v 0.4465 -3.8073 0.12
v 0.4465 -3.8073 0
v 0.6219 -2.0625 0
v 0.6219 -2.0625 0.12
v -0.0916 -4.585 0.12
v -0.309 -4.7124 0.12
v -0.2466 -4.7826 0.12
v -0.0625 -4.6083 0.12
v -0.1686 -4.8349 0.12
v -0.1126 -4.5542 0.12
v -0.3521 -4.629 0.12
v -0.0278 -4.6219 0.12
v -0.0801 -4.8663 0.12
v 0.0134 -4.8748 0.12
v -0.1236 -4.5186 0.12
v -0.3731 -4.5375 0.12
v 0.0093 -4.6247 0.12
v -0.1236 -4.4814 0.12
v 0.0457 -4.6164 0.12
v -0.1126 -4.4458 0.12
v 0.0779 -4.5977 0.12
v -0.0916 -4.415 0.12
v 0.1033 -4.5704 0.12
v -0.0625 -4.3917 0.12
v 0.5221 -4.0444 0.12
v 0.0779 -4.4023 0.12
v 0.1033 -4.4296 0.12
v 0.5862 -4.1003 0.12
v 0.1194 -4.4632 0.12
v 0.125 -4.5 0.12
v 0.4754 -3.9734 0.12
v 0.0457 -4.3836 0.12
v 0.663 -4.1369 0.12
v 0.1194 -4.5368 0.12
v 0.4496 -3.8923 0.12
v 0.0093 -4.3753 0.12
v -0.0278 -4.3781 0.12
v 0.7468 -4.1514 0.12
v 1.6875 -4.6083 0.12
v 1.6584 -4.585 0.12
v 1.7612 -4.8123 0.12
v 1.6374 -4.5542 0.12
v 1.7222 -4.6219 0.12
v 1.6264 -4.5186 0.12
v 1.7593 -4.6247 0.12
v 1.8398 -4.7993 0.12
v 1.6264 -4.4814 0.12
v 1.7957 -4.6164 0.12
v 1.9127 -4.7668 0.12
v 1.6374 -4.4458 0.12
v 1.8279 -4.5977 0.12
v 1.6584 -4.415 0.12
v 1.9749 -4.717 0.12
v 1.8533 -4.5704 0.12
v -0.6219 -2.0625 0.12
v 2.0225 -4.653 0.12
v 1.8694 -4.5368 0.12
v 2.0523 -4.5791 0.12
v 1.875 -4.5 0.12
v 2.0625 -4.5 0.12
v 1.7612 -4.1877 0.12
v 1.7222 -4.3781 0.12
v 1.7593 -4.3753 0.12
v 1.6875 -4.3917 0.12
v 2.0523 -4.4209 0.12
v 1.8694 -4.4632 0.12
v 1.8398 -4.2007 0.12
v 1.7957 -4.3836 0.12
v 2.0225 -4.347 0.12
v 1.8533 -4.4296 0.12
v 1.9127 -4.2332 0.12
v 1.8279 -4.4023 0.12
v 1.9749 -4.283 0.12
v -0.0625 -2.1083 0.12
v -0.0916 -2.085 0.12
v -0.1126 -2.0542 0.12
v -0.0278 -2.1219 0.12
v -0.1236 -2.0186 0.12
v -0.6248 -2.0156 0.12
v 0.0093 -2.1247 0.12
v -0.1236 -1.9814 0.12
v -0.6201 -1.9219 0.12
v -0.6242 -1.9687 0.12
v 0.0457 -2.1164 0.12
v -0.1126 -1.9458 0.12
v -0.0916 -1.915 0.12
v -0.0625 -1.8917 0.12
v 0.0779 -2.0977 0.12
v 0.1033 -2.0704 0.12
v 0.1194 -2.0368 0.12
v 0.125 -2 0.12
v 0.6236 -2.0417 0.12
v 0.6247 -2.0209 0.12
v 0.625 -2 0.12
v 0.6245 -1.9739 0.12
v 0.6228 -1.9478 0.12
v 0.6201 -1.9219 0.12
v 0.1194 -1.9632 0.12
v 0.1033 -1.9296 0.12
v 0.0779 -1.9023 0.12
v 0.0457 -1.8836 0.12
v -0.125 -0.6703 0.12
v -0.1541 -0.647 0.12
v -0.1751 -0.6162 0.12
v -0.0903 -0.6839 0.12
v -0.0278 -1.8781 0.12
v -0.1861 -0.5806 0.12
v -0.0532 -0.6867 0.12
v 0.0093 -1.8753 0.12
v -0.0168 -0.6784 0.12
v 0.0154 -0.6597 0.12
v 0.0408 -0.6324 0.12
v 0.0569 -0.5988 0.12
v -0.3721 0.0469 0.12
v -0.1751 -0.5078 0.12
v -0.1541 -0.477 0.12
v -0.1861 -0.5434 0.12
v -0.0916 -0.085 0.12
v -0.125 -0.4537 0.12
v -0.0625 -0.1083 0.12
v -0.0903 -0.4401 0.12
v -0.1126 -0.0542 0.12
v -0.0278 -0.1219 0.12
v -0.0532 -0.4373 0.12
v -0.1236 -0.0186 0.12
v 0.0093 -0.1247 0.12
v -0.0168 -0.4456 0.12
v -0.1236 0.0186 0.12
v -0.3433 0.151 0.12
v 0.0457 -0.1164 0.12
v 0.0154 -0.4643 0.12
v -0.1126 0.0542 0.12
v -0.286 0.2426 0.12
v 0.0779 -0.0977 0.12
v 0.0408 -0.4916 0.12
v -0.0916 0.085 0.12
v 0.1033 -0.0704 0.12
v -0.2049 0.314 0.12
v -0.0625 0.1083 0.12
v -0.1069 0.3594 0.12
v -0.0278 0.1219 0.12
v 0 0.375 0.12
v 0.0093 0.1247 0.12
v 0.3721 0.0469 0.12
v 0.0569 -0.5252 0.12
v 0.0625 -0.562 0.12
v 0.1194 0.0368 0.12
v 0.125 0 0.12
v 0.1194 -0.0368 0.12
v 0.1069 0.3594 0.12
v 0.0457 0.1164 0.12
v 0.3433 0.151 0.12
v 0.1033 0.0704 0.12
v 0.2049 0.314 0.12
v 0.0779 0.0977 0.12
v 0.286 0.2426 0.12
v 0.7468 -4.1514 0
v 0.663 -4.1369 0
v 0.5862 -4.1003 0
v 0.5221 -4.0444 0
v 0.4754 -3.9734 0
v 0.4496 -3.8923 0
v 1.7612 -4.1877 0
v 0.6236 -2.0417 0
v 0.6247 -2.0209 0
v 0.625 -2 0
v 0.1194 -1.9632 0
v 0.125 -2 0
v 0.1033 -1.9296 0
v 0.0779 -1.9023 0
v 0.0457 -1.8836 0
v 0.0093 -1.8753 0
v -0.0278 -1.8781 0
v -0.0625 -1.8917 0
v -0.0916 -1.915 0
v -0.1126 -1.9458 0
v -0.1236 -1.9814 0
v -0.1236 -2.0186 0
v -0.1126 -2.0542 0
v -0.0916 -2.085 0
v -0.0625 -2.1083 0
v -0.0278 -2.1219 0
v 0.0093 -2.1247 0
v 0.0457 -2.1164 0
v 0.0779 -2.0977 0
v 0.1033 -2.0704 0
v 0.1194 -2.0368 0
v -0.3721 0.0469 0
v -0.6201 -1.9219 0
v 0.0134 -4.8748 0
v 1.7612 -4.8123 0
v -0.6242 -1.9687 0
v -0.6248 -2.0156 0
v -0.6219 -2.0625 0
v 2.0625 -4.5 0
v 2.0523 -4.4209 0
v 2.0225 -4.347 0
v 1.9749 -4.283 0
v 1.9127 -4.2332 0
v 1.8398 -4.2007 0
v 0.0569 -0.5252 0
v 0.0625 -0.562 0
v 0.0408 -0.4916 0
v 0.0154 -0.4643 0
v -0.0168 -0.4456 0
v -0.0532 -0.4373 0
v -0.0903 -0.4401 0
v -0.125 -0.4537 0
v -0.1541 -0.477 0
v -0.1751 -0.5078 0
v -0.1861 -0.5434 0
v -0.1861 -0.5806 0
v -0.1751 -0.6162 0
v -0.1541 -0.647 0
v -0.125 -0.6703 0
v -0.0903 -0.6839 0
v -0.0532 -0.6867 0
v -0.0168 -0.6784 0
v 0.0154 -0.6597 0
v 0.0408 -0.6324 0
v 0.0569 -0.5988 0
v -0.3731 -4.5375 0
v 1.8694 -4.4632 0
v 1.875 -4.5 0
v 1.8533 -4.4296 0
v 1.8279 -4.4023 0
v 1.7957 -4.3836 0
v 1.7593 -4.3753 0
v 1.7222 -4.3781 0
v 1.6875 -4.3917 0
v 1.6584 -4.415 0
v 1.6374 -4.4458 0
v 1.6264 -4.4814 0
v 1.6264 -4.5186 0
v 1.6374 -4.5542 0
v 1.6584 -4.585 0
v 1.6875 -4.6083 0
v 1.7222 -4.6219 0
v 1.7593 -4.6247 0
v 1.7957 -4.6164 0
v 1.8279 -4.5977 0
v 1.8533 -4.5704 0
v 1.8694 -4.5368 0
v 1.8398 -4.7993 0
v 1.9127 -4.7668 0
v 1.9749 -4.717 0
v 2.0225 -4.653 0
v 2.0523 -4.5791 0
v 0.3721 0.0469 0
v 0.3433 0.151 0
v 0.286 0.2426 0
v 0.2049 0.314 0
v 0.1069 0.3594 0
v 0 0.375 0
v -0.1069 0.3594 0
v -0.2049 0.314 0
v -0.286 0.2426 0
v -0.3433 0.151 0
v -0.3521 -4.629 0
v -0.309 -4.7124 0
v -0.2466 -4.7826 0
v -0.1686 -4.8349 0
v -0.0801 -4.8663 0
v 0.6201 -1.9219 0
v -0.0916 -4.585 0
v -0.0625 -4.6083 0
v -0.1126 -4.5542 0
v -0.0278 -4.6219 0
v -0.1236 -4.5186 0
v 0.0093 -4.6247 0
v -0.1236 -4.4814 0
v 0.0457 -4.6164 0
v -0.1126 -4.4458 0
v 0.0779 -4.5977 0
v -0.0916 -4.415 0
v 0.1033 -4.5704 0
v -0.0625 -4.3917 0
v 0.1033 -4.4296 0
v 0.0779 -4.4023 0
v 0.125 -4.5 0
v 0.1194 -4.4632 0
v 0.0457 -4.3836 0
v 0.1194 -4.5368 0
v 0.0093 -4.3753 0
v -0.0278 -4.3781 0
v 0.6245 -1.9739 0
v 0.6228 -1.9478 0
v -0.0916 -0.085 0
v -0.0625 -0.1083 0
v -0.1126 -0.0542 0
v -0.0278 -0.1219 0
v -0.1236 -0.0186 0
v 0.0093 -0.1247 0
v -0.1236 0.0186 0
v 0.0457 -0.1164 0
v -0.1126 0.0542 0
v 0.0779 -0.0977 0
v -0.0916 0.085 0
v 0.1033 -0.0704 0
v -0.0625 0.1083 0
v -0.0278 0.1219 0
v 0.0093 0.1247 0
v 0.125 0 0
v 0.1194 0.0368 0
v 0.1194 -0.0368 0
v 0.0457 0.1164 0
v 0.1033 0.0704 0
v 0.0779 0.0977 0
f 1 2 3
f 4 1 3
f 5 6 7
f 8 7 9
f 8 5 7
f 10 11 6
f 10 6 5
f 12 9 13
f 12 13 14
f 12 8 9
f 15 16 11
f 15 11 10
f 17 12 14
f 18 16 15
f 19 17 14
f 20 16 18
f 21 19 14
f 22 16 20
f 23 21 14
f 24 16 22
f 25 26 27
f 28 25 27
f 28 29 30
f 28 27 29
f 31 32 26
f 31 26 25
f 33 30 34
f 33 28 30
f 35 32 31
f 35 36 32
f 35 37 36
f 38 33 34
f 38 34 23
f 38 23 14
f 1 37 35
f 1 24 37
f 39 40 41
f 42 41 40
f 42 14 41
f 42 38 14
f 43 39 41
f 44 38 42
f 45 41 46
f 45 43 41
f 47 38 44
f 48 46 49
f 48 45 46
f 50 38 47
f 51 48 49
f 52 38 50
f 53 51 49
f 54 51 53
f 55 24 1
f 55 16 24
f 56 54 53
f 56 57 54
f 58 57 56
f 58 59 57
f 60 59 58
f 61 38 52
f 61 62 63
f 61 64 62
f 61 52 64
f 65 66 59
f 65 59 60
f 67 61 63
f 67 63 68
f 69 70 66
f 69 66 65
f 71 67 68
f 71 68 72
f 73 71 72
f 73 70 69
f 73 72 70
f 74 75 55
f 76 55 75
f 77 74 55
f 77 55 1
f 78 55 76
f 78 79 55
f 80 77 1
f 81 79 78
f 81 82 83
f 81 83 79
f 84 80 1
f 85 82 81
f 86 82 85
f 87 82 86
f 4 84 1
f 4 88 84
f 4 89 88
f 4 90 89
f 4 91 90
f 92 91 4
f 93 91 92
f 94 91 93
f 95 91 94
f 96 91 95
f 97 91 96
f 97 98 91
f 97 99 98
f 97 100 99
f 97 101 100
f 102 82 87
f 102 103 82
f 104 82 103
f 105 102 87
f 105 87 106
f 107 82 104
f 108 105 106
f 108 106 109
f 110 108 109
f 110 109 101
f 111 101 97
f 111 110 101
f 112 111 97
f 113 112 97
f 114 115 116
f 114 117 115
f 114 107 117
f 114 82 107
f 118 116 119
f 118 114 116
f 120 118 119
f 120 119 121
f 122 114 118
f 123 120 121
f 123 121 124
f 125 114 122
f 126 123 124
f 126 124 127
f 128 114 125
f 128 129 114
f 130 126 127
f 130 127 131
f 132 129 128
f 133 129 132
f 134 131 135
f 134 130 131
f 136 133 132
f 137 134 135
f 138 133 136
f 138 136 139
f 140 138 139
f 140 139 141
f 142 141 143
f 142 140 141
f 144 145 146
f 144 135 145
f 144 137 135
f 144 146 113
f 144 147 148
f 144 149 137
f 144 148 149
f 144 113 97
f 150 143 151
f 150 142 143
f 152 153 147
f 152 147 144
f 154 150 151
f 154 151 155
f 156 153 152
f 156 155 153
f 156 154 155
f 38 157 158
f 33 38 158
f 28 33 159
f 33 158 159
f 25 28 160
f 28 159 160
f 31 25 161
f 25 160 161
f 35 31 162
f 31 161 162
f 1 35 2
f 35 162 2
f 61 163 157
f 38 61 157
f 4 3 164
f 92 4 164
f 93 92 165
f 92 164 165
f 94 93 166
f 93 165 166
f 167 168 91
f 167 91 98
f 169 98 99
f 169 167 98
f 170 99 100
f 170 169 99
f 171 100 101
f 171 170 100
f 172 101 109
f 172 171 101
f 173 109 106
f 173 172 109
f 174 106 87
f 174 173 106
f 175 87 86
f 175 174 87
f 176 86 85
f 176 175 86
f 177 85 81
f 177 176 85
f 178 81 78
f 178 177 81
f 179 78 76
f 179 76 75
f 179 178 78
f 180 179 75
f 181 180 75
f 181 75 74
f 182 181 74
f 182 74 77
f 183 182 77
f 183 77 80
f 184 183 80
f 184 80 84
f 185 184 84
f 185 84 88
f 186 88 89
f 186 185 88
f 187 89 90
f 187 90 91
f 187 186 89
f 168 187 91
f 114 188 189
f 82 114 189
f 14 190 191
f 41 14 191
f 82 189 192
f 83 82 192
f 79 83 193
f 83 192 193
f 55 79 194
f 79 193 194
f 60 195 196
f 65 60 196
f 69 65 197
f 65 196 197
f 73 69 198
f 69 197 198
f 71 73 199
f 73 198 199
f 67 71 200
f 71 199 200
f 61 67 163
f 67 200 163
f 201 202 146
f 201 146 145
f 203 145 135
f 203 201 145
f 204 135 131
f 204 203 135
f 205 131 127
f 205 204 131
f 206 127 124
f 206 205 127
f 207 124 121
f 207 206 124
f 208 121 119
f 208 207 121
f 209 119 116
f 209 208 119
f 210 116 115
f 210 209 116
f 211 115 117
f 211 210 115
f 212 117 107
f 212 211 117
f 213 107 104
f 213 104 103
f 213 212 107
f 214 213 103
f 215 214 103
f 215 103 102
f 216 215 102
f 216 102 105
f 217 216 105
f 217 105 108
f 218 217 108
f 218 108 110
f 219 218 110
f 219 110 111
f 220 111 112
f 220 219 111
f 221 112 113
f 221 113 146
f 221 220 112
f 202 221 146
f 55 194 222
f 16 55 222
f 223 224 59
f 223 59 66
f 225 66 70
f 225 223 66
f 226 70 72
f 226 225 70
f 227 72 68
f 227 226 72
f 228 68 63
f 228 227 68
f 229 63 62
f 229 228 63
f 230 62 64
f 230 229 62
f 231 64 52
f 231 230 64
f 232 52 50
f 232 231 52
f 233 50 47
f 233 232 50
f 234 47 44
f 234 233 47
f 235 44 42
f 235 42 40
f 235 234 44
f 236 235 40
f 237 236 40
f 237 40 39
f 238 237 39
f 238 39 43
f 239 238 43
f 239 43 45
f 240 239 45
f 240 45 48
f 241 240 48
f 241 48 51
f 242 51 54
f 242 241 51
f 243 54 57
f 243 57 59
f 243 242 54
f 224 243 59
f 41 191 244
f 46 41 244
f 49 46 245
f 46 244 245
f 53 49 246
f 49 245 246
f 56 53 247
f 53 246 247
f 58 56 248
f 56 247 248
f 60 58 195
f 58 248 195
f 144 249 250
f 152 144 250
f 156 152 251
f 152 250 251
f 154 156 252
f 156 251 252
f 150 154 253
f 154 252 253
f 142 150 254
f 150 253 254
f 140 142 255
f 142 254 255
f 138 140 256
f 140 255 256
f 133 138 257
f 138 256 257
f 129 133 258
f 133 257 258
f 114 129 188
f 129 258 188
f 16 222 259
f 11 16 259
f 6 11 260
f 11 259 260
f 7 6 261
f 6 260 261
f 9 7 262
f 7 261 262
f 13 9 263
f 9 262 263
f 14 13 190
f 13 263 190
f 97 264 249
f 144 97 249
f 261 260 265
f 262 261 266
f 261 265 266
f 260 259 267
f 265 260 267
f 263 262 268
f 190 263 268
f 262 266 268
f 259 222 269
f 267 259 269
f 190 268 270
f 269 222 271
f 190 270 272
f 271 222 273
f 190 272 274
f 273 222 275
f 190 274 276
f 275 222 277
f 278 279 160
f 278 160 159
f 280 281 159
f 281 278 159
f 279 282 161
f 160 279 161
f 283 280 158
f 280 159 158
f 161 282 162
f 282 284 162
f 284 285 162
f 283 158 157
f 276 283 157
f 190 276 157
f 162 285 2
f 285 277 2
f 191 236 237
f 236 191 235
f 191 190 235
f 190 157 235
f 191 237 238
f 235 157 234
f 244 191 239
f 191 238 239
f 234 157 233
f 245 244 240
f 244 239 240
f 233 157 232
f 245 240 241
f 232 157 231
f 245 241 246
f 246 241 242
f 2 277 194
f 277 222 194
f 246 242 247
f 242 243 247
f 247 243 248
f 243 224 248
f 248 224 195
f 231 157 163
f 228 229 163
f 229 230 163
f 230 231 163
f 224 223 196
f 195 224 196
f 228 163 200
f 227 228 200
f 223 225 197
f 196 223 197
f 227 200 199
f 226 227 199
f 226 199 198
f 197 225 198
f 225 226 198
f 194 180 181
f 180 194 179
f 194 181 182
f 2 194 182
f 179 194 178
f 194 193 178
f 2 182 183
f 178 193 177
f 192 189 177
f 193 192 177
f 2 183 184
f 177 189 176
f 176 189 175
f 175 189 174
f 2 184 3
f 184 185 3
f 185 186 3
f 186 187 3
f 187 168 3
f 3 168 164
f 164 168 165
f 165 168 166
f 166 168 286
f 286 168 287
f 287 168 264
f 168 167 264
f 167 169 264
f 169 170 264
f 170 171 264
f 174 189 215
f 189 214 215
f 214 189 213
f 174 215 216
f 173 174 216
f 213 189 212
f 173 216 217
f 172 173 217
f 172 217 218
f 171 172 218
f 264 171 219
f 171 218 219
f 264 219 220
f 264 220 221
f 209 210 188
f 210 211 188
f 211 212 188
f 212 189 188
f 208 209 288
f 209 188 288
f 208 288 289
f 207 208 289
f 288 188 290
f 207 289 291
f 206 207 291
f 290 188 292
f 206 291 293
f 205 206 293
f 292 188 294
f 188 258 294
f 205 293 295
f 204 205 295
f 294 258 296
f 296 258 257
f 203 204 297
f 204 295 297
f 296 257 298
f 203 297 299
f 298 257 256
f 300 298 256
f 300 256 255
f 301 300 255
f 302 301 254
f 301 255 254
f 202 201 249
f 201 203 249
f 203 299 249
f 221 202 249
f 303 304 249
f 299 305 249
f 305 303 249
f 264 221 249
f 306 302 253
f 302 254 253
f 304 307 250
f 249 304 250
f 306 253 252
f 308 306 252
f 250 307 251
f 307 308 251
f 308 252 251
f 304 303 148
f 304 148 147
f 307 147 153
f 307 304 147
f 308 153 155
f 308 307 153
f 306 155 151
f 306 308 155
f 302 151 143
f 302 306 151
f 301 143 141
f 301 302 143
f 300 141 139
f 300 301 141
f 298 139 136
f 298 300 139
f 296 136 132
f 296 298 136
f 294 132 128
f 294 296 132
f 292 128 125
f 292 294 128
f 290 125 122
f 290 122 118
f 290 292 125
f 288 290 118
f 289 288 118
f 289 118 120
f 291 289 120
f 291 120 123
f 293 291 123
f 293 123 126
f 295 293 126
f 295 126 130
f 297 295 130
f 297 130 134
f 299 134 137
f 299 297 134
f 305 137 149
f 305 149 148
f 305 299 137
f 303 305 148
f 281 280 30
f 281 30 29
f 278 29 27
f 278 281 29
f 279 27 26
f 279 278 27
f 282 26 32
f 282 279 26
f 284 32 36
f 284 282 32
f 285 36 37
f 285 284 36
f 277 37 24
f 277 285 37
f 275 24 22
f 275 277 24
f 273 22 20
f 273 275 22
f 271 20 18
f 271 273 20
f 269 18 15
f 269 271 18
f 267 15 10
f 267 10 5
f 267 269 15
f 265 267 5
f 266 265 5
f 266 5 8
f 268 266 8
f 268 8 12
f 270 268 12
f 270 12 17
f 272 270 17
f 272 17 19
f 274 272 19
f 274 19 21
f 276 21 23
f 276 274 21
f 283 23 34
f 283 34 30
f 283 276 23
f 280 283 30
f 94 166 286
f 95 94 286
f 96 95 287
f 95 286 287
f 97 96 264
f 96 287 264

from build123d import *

# Parameters (mm, degrees)
F0_R     = 0.125
F1_DEPTH = 0.12


with BuildPart() as f1:
    # F0 (on Top) → F1 (new body)
    with BuildSketch(Plane.XY):
        with BuildLine():
            ThreePointArc((-0.372059, 0.046875), (-0.023484, -0.374264), (0.375, 0))
            ThreePointArc((0.375, 0), (0.374264, 0.023484), (0.372059, 0.046875))
            ThreePointArc((0.372059, 0.046875), (0, 0.375), (-0.372059, 0.046875))
        make_face()
        Circle(F0_R, mode=Mode.SUBTRACT)
        with BuildLine():
            ThreePointArc((0.372059, 0.046875), (0.374264, 0.023484), (0.375, 0))
            ThreePointArc((0.375, 0), (-0.023484, -0.374264), (-0.372059, 0.046875))
            Line((-0.372059, 0.046875), (-0.620098, -1.921875))
            ThreePointArc((-0.620098, -1.921875), (0, -1.375), (0.620098, -1.921875))
            Line((0.620098, -1.921875), (0.372059, 0.046875))
        make_face()
        with Locations((-0.0625, -0.562)):
            Circle(F0_R, mode=Mode.SUBTRACT)
        with BuildLine():
            ThreePointArc((0.625, -2), (0.623773, -1.960861), (0.620098, -1.921875))
            ThreePointArc((0.620098, -1.921875), (0, -1.375), (-0.620098, -1.921875))
            ThreePointArc((-0.620098, -1.921875), (-0.624951, -1.992138), (-0.621867, -2.0625))
            ThreePointArc((-0.621867, -2.0625), (0, -2.625), (0.621867, -2.0625))
            ThreePointArc((0.621867, -2.0625), (0.624216, -2.031289), (0.625, -2))
        make_face()
        with Locations((0, -2)):
            Circle(F0_R, mode=Mode.SUBTRACT)
        with BuildLine():
            ThreePointArc((0.621867, -2.0625), (0, -2.625), (-0.621867, -2.0625))
            Line((-0.621867, -2.0625), (-0.37312, -4.5375))
            ThreePointArc((-0.37312, -4.5375), (-0.018774, -4.12547), (0.375, -4.5))
            ThreePointArc((0.375, -4.5), (0.269859, -4.760387), (0.013393, -4.874761))
            Line((0.013393, -4.874761), (1.761161, -4.812301))
            ThreePointArc((1.761161, -4.812301), (1.4375, -4.5), (1.761161, -4.187699))
            Line((1.761161, -4.187699), (0.746756, -4.151447))
            ThreePointArc((0.746756, -4.151447), (0.522094, -4.044435), (0.446503, -3.807347))
            Line((0.446503, -3.807347), (0.621867, -2.0625))
        make_face()
        with BuildLine():
            ThreePointArc((0.375, -4.5), (-0.018774, -4.12547), (-0.37312, -4.5375))
            ThreePointArc((-0.37312, -4.5375), (-0.246551, -4.782556), (0.013393, -4.874761))
            ThreePointArc((0.013393, -4.874761), (0.269859, -4.760387), (0.375, -4.5))
        make_face()
        with Locations((0, -4.5)):
            Circle(F0_R, mode=Mode.SUBTRACT)
        with BuildLine():
            ThreePointArc((1.761161, -4.187699), (1.4375, -4.5), (1.761161, -4.812301))
            ThreePointArc((1.761161, -4.812301), (1.974882, -4.716989), (2.0625, -4.5))
            ThreePointArc((2.0625, -4.5), (1.974882, -4.283011), (1.761161, -4.187699))
        make_face()
        with Locations((1.75, -4.5)):
            Circle(F0_R, mode=Mode.SUBTRACT)
    extrude(amount=F1_DEPTH)


solid = f1.part
